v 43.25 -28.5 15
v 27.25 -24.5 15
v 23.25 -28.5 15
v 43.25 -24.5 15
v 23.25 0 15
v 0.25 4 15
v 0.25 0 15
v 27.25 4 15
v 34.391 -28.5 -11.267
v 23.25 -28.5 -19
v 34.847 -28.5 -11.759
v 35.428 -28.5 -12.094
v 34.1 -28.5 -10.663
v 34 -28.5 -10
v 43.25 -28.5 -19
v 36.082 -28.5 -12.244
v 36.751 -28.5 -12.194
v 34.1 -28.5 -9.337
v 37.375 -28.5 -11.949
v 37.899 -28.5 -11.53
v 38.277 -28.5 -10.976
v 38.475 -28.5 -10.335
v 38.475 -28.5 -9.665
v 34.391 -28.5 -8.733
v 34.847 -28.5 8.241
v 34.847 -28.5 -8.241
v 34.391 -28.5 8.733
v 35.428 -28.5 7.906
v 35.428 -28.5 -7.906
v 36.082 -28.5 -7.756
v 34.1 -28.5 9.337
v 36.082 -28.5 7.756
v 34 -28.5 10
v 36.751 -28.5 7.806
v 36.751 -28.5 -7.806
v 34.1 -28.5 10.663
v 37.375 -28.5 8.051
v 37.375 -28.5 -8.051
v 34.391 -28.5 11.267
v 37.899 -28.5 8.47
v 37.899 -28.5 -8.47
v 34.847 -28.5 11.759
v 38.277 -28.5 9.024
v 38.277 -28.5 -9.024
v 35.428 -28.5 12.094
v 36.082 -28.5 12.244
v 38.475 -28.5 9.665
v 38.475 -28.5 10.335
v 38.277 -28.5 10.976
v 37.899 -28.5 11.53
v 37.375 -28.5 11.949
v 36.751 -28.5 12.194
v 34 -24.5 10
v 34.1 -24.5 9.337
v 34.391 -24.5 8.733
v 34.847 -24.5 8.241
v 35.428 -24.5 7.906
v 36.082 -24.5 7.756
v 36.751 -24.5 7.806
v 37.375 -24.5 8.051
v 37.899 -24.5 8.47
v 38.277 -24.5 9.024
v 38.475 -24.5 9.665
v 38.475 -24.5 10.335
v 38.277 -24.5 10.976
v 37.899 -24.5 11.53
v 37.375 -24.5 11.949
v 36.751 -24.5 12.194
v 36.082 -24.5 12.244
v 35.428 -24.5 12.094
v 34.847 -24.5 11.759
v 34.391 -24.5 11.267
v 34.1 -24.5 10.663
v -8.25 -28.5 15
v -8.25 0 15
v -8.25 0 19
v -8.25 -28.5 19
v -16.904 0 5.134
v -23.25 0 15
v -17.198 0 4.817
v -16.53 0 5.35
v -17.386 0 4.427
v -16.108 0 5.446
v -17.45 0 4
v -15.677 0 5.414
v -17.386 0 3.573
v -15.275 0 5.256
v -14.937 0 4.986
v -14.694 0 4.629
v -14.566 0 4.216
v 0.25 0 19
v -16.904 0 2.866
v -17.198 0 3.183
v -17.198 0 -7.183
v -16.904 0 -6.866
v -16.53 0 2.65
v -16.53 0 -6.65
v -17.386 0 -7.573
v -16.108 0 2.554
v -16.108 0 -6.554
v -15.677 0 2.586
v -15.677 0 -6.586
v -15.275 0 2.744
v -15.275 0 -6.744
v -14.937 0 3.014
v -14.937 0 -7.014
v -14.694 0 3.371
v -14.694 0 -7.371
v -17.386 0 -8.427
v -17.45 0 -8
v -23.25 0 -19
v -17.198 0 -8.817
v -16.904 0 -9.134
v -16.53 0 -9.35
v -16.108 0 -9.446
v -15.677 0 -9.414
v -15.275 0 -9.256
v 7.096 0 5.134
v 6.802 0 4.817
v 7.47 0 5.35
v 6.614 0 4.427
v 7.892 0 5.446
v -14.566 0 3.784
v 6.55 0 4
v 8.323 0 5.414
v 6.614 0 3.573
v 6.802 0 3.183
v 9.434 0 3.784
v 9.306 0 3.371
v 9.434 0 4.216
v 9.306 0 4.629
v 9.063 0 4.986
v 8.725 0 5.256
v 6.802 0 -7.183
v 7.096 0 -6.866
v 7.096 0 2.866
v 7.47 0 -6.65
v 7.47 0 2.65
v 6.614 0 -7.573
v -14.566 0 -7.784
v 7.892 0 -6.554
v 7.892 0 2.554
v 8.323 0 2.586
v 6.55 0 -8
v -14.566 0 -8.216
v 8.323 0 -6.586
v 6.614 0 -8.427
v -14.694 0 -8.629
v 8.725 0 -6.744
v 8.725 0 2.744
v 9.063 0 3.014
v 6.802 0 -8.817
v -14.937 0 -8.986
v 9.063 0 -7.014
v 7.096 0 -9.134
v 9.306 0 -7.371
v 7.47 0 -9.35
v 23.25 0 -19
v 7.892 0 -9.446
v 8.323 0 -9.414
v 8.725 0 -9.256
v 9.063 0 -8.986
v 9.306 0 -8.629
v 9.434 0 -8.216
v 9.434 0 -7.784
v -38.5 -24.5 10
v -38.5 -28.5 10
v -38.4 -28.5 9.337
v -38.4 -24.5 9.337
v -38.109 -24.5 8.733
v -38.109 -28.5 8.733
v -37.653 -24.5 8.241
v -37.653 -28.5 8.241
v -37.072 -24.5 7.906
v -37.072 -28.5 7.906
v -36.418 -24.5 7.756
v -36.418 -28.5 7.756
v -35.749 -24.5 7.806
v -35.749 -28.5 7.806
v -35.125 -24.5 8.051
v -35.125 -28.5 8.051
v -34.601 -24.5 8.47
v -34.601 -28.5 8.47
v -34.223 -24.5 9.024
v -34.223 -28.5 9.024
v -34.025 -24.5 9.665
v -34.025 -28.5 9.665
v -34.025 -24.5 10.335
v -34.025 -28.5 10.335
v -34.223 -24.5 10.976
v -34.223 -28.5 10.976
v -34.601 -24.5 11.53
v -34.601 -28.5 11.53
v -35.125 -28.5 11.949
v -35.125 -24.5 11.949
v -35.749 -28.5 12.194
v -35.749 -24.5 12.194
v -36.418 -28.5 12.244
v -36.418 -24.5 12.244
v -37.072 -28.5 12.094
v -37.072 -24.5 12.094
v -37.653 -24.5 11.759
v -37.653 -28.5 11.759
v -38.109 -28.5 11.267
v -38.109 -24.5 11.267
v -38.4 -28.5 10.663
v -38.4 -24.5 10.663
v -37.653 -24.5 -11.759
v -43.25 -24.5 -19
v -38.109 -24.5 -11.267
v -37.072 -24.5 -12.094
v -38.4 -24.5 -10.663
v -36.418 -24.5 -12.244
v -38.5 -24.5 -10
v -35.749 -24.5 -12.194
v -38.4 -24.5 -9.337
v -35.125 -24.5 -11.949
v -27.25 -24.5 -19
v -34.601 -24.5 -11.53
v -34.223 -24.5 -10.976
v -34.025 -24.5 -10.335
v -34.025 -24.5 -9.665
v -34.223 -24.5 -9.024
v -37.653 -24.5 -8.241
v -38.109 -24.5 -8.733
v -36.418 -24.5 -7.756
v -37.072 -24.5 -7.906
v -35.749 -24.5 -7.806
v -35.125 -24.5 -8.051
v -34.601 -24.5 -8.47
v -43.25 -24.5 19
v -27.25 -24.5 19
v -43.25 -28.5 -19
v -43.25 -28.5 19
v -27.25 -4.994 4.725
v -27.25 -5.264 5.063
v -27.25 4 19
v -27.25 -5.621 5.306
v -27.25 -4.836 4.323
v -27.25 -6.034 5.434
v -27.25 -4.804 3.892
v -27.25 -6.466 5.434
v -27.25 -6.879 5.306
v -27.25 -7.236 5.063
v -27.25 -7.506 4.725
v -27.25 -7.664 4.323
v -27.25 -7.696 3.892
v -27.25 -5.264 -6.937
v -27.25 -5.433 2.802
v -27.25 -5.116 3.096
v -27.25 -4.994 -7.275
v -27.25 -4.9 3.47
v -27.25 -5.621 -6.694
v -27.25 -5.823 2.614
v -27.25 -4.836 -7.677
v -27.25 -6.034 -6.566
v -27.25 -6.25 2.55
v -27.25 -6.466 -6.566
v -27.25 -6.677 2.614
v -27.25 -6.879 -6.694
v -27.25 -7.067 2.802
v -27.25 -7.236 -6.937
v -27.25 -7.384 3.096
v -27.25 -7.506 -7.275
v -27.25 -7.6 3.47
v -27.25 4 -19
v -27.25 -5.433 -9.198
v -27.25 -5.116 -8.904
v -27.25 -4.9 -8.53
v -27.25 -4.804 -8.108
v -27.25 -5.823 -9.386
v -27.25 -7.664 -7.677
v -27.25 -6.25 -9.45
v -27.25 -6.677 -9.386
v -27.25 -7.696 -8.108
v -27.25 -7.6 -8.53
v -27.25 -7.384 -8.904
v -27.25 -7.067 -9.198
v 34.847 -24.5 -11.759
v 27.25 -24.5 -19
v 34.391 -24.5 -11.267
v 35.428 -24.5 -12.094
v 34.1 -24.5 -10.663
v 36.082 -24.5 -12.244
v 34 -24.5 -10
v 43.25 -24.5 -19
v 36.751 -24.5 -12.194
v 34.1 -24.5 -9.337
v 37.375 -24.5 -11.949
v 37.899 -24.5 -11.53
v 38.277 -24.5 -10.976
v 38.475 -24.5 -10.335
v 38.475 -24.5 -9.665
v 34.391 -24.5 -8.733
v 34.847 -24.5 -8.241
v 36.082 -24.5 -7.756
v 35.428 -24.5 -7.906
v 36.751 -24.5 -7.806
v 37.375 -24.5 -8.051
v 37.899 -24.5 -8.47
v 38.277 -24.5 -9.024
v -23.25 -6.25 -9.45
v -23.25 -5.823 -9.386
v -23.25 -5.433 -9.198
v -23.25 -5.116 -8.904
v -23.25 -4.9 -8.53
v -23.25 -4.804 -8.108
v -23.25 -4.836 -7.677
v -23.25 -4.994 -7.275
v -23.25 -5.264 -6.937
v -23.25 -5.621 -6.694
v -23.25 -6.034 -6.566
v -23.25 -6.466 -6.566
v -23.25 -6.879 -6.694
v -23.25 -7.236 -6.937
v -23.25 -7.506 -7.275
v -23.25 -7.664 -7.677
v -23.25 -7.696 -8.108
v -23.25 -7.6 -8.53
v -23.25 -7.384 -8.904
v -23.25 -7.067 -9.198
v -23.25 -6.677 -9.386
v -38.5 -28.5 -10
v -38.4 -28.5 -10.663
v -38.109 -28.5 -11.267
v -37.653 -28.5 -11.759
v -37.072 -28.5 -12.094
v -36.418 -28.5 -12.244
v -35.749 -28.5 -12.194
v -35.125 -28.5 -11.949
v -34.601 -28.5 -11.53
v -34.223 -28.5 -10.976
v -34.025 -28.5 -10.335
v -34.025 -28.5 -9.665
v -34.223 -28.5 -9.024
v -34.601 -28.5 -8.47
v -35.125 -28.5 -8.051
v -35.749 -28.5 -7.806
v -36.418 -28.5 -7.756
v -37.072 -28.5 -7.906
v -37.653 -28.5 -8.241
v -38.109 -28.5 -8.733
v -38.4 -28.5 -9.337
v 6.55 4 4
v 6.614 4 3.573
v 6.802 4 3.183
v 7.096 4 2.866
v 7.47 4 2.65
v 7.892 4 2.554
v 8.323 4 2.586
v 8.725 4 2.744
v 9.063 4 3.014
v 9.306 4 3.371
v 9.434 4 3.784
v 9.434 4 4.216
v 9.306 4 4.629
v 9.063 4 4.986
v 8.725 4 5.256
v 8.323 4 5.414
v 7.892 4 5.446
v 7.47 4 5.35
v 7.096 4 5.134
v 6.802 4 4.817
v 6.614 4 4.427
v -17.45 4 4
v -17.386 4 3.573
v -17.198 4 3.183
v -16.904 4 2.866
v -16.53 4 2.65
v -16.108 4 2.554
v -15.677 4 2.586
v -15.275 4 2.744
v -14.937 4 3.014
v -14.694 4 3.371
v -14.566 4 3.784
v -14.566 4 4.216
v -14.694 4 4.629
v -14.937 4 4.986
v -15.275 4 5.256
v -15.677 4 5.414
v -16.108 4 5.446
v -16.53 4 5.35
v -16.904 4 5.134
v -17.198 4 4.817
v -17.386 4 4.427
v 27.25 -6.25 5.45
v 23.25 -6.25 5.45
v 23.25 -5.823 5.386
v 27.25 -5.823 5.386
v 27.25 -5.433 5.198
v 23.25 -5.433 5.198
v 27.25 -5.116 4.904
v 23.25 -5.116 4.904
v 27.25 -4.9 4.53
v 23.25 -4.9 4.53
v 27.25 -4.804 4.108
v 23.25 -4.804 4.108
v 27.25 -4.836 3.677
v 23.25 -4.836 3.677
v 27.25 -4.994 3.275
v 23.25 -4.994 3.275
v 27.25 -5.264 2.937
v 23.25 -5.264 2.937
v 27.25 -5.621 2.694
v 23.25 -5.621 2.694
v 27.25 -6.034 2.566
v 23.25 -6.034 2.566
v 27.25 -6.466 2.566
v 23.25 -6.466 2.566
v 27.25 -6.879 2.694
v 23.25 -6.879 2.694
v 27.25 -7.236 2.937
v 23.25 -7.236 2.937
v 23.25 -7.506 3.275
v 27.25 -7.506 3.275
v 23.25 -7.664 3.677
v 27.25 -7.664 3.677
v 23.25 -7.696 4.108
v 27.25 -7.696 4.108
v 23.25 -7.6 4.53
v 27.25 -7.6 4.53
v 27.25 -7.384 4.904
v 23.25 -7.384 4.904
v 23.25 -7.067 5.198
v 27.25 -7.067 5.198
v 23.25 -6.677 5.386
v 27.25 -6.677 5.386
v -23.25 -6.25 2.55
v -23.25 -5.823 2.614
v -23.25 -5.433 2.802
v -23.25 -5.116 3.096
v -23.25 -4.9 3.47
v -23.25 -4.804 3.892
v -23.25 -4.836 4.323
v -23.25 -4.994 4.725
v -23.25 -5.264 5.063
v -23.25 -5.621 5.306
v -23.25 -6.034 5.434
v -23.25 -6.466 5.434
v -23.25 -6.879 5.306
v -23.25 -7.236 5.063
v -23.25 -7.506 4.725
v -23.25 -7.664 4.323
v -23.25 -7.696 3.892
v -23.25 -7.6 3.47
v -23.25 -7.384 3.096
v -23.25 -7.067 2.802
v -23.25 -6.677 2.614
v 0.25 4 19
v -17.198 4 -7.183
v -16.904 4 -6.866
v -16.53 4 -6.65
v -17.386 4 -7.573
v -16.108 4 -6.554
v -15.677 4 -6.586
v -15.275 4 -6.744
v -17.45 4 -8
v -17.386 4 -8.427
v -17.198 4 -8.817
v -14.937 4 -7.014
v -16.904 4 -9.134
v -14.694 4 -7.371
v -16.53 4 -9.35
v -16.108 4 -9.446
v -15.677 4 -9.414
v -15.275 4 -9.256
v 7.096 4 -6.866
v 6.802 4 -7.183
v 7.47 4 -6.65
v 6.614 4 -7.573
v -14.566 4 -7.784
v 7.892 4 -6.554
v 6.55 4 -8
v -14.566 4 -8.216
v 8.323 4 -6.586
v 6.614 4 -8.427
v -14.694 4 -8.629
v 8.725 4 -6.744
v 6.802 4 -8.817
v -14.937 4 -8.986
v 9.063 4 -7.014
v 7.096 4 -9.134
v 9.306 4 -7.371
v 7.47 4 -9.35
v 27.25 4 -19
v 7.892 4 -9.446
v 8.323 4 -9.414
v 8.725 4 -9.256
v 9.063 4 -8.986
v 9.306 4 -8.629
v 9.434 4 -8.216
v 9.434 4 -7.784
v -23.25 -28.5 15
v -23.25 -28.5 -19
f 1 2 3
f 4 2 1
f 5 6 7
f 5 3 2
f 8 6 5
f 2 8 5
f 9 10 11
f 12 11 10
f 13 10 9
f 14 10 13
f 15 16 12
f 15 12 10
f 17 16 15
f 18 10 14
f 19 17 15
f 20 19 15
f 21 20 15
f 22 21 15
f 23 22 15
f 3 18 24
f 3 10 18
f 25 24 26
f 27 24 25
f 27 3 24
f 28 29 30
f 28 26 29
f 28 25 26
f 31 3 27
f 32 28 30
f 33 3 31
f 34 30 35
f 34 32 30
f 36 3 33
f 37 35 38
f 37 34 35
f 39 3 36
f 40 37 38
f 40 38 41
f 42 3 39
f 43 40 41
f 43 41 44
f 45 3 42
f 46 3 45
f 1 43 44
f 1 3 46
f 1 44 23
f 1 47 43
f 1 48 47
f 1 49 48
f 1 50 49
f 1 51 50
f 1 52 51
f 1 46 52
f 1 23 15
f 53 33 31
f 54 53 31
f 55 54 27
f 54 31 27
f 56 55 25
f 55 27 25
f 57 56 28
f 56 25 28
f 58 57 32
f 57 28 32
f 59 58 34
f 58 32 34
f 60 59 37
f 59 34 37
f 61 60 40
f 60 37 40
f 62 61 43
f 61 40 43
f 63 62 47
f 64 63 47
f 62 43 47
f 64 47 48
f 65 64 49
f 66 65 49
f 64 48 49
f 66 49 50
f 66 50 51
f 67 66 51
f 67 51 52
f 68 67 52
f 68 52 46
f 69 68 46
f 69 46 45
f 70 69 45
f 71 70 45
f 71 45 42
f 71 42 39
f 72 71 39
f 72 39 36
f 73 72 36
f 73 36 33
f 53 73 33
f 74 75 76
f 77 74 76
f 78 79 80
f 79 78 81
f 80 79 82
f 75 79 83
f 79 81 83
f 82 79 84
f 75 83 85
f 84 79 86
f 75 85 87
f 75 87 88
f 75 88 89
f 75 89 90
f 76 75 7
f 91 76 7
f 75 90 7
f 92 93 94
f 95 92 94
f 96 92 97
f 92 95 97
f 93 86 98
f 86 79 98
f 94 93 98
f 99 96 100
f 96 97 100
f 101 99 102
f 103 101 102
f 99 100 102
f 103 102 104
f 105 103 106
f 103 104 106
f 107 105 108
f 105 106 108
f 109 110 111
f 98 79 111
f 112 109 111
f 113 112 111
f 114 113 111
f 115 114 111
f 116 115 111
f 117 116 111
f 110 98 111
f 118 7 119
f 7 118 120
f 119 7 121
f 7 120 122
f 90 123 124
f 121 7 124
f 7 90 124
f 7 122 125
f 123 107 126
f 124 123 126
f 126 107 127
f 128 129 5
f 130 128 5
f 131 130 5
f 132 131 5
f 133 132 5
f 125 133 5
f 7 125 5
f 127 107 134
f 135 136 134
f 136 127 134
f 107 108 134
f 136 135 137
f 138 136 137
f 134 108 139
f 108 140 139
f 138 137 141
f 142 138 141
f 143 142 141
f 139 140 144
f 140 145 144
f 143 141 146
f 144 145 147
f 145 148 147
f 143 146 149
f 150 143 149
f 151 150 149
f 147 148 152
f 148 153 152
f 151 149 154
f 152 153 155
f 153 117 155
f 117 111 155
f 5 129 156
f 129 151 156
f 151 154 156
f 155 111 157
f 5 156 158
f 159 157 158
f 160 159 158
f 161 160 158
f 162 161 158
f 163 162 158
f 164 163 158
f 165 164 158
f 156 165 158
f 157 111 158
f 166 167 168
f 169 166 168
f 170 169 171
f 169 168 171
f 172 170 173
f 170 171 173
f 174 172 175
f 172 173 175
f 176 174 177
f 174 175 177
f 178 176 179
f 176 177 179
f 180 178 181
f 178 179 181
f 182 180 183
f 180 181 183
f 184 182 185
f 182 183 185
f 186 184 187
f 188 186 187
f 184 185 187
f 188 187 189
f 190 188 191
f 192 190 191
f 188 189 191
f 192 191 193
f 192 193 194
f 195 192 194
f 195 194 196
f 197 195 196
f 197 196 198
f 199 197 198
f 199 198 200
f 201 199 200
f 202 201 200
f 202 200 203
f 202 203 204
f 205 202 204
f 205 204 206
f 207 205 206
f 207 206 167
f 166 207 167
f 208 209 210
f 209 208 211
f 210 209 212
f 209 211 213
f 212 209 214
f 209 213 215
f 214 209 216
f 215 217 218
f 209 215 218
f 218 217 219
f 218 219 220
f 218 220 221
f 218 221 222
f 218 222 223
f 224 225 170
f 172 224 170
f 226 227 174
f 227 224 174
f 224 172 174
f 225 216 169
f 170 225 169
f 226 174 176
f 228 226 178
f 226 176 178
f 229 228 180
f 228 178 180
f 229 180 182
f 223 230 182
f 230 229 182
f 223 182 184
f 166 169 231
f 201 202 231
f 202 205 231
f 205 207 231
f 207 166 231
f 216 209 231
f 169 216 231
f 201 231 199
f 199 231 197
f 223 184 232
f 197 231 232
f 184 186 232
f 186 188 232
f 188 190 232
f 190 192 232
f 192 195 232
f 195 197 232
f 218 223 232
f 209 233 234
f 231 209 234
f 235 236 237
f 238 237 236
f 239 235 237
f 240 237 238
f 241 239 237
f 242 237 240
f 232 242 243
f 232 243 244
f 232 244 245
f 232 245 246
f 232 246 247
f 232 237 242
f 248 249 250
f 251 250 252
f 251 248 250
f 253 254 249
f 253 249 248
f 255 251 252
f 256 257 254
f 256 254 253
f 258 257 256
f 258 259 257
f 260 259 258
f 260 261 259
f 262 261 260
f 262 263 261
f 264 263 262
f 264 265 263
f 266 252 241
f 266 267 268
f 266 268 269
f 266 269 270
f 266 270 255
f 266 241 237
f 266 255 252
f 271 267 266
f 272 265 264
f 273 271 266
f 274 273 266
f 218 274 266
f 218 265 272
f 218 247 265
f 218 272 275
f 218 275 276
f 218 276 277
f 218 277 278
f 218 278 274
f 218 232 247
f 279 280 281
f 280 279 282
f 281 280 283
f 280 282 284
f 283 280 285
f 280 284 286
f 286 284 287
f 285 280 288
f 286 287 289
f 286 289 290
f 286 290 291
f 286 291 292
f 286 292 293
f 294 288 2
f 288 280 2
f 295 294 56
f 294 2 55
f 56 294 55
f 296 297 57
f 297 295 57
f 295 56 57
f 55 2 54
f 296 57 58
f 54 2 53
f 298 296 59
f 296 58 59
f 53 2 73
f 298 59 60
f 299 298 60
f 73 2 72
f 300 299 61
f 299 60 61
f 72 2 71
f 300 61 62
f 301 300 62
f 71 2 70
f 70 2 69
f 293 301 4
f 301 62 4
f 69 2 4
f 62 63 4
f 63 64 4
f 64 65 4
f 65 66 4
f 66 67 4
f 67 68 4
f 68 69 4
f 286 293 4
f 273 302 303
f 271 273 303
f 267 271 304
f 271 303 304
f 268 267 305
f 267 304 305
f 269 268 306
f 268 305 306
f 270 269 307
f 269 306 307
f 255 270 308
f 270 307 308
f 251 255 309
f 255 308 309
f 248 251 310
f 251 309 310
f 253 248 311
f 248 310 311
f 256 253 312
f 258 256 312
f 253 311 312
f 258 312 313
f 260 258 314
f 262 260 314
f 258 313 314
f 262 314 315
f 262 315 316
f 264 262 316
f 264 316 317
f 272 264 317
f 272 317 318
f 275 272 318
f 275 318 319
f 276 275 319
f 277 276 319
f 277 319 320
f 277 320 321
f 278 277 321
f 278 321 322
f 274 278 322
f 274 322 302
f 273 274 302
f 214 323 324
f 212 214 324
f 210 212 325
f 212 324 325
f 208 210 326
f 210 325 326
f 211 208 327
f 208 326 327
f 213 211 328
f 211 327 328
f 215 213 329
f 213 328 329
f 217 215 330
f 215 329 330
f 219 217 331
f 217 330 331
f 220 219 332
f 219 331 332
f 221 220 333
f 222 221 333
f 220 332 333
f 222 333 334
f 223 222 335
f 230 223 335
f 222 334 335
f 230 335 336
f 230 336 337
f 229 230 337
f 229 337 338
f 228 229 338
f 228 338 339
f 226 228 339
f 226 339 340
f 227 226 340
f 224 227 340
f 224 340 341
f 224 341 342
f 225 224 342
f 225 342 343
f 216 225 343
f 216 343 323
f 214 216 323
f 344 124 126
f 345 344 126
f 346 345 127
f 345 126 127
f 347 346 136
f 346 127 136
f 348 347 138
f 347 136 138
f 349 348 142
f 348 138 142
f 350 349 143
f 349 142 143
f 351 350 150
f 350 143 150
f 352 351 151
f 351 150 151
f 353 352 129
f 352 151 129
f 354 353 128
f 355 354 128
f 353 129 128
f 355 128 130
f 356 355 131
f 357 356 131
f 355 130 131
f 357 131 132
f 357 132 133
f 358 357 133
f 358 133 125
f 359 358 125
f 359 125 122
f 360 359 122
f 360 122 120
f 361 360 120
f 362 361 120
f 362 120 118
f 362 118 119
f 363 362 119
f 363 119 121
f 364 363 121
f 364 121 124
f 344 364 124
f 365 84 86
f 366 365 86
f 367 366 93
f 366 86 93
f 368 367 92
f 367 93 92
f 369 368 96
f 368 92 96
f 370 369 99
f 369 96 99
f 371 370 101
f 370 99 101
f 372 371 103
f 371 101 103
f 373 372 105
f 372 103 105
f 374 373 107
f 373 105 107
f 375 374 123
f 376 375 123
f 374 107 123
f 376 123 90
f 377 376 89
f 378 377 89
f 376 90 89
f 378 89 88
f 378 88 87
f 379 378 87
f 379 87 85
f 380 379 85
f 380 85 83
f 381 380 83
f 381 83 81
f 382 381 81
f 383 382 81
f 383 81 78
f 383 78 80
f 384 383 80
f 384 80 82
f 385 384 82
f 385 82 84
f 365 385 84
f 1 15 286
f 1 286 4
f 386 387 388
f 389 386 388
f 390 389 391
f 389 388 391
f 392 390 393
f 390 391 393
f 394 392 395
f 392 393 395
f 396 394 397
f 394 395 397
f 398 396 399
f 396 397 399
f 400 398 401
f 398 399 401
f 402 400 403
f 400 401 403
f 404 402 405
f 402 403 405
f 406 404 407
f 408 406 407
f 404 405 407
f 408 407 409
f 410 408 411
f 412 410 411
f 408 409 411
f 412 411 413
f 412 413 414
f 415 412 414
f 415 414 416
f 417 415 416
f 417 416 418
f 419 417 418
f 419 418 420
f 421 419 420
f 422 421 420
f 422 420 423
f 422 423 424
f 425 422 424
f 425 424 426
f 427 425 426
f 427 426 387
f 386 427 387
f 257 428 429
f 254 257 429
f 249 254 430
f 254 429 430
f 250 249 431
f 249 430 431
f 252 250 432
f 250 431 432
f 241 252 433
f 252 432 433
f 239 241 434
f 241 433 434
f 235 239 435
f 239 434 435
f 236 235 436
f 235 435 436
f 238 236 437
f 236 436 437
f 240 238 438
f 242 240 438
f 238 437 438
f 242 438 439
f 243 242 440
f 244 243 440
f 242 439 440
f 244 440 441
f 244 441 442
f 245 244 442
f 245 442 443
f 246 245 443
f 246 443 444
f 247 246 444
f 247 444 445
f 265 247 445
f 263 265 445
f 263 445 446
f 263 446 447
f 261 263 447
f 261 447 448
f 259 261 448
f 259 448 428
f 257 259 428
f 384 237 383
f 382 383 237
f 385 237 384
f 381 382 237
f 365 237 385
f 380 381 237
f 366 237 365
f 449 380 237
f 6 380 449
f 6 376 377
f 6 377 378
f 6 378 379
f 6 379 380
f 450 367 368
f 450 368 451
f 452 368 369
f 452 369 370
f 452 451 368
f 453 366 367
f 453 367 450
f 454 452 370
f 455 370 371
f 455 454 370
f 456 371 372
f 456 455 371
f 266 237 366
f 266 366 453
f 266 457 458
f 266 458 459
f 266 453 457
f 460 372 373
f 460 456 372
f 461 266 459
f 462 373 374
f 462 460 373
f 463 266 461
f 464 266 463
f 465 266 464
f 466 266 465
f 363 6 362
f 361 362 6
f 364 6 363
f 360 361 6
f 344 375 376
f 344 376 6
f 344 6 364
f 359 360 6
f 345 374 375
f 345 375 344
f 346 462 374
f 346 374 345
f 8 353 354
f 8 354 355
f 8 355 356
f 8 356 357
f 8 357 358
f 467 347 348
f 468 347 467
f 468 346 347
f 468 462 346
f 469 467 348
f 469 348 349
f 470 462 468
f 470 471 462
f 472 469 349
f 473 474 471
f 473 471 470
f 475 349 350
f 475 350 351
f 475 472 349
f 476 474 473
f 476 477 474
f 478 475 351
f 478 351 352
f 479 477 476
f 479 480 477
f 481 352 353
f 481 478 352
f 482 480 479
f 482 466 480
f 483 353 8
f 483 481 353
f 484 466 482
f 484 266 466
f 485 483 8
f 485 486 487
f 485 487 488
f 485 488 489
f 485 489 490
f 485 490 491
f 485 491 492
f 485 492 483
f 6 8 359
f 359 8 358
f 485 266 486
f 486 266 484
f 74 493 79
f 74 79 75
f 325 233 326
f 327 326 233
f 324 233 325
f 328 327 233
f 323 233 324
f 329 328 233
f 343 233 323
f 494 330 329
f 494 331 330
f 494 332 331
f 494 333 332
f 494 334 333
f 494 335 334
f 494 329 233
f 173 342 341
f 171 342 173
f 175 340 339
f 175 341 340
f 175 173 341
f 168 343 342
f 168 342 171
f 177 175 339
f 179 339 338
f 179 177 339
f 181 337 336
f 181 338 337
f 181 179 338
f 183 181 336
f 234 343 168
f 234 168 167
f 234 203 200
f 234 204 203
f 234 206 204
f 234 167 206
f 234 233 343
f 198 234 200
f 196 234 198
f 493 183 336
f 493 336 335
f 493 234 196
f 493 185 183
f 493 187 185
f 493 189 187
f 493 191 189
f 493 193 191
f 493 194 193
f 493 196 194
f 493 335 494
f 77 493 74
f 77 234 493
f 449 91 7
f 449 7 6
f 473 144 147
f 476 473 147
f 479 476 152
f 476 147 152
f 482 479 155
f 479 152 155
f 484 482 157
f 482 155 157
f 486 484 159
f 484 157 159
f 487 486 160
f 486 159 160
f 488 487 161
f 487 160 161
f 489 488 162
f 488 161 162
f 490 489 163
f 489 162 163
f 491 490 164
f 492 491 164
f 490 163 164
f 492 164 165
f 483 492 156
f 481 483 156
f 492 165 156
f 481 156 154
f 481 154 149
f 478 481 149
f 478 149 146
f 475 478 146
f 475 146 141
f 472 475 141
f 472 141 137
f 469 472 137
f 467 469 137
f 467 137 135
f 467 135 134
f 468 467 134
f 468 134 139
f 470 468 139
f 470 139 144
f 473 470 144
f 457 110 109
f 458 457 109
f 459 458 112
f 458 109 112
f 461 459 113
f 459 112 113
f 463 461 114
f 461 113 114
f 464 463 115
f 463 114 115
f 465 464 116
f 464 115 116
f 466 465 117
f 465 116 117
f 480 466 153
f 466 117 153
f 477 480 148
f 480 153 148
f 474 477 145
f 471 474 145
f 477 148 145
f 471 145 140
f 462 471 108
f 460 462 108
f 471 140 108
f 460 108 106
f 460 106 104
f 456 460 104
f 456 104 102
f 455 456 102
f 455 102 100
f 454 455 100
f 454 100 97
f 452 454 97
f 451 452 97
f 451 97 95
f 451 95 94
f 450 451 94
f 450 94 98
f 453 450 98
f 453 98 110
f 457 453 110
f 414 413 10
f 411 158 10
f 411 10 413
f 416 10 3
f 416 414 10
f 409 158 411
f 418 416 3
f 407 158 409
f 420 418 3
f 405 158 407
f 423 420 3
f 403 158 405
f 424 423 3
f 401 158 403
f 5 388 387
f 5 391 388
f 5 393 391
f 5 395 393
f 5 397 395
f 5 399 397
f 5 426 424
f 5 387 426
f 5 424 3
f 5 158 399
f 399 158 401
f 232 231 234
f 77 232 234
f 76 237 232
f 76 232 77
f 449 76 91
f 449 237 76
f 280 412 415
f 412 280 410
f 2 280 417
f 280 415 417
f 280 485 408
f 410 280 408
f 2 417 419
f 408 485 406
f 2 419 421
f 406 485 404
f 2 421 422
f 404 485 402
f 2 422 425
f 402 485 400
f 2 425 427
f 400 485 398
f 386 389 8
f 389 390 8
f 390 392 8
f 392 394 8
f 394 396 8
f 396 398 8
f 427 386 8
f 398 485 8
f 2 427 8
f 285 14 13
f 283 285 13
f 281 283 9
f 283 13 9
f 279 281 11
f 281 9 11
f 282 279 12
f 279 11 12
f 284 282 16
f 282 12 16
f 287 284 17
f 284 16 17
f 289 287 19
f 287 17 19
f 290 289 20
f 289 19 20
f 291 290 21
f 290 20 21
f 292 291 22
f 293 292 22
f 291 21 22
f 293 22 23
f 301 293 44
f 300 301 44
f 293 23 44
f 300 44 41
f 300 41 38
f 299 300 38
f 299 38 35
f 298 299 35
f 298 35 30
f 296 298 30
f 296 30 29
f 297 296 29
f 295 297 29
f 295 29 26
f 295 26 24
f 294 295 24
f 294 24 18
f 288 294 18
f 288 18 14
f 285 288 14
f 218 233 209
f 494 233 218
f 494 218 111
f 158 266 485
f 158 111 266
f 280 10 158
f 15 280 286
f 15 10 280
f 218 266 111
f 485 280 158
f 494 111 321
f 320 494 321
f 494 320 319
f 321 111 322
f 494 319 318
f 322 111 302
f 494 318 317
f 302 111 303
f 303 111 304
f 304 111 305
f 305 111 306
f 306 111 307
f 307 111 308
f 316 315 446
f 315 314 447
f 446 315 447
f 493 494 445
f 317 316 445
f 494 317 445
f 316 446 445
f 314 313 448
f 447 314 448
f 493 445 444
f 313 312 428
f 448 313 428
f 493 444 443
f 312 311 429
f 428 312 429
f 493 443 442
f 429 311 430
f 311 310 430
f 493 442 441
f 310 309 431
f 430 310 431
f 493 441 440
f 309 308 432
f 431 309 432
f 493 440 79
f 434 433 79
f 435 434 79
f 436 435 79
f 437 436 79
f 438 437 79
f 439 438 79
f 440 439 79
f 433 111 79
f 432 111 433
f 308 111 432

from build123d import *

# Parameters (mm, degrees)
SKETCH_31_W              = 54.5
SKETCH_31_H              = 38
EXTRUDE_11_DEPTH         = 4
SKETCH_32_W              = 4
SKETCH_32_H              = 38
EXTRUDE_12_DEPTH         = 28.5
SKETCH_33_W              = 16
SKETCH_33_H              = 38
EXTRUDE_13_DEPTH         = 4
SKETCH_34_W              = 15
SKETCH_34_H              = 4
EXTRUDE_14_DEPTH         = 28.5
HOLE_WIZARD_M2_5_1_D     = 2.9
HOLE_WIZARD_M2_5_1_DEPTH = 10
HOLE_WIZARD_M2_5_1_TIP   = 0.871247898
HOLE_WIZARD_M2_5_2_D     = 2.9
HOLE_WIZARD_M2_5_2_DEPTH = 10
HOLE_WIZARD_M2_5_2_TIP   = 0.871247898
HOLE_WIZARD_M2_5_3_D     = 2.9
HOLE_WIZARD_M2_5_3_DEPTH = 10
HOLE_WIZARD_M2_5_3_TIP   = 0.871247898
HOLE_WIZARD_M4_1_D       = 4.5
HOLE_WIZARD_M4_1_DEPTH   = 10
HOLE_WIZARD_M4_1_TIP     = 1.351936393
SKETCH_46_W              = 43
SKETCH_46_H              = 32.5
CUT_EXTRUDE_4_DEPTH      = 4


with BuildPart() as part:
    # 스케치31 → 보스-돌출11 (new body)
    with BuildSketch(Plane(origin=(0, 0, 0), x_dir=(1, 0, 0), z_dir=(0, 1, 0))):
        Rectangle(SKETCH_31_W, SKETCH_31_H)
    extrude(amount=EXTRUDE_11_DEPTH)

    # 스케치32 → 보스-돌출12 (add)
    with BuildSketch(Plane.XZ):
        with Locations((25.25, 0)):
            Rectangle(SKETCH_32_W, SKETCH_32_H)
        with Locations((-25.25, 0)):
            Rectangle(SKETCH_32_W, SKETCH_32_H)
    extrude(amount=EXTRUDE_12_DEPTH)

    # 스케치33 → 보스-돌출13 (add)
    with BuildSketch(Plane.XZ.offset(28.5)):
        with Locations((-35.25, 0)):
            Rectangle(SKETCH_33_W, SKETCH_33_H)
        with Locations((35.25, 0)):
            Rectangle(SKETCH_33_W, SKETCH_33_H)
    extrude(amount=-EXTRUDE_13_DEPTH)

    # 스케치34 → 보스-돌출14 (add)
    with BuildSketch(Plane.XZ):
        with Locations((-15.75, 17)):
            Rectangle(SKETCH_34_W, SKETCH_34_H)
    extrude(amount=EXTRUDE_14_DEPTH)

    # M2.5 여유 구멍1
    with Locations(Plane(origin=(0, 4, 0), x_dir=(1, 0, 0), z_dir=(0, 1, 0))):
        with Locations((8, 8), (8, -4), (-16, -4), (-16, 8)):
            Hole(HOLE_WIZARD_M2_5_1_D / 2, depth=HOLE_WIZARD_M2_5_1_DEPTH)
            with Locations((0, 0, -(HOLE_WIZARD_M2_5_1_DEPTH + HOLE_WIZARD_M2_5_1_TIP / 2))):  # 118° drill point
                Cone(0, HOLE_WIZARD_M2_5_1_D / 2, HOLE_WIZARD_M2_5_1_TIP, mode=Mode.SUBTRACT)

    # M2.5 여유 구멍2
    with Locations(Plane(origin=(27.25, 0, 0), x_dir=(0, 0, -1), z_dir=(1, 0, 0))):
        with Locations((-4, -6.25)):
            Hole(HOLE_WIZARD_M2_5_2_D / 2, depth=HOLE_WIZARD_M2_5_2_DEPTH)
            with Locations((0, 0, -(HOLE_WIZARD_M2_5_2_DEPTH + HOLE_WIZARD_M2_5_2_TIP / 2))):  # 118° drill point
                Cone(0, HOLE_WIZARD_M2_5_2_D / 2, HOLE_WIZARD_M2_5_2_TIP, mode=Mode.SUBTRACT)

    # M2.5 여유 구멍3
    with Locations(Plane.ZY.offset(27.25)):
        with Locations((4, -6.25), (-8, -6.25)):
            Hole(HOLE_WIZARD_M2_5_3_D / 2, depth=HOLE_WIZARD_M2_5_3_DEPTH)
            with Locations((0, 0, -(HOLE_WIZARD_M2_5_3_DEPTH + HOLE_WIZARD_M2_5_3_TIP / 2))):  # 118° drill point
                Cone(0, HOLE_WIZARD_M2_5_3_D / 2, HOLE_WIZARD_M2_5_3_TIP, mode=Mode.SUBTRACT)

    # M4 여유 구멍1
    with Locations(Plane(origin=(0, -24.5, 0), x_dir=(1, 0, 0), z_dir=(0, 1, 0))):
        with Locations((36.25, 10), (36.25, -10), (-36.25, -10), (-36.25, 10)):
            Hole(HOLE_WIZARD_M4_1_D / 2, depth=HOLE_WIZARD_M4_1_DEPTH)
            with Locations((0, 0, -(HOLE_WIZARD_M4_1_DEPTH + HOLE_WIZARD_M4_1_TIP / 2))):  # 118° drill point
                Cone(0, HOLE_WIZARD_M4_1_D / 2, HOLE_WIZARD_M4_1_TIP, mode=Mode.SUBTRACT)

    # 스케치46 → 컷-돌출4 (cut)
    with BuildSketch(Plane.XY.offset(19)):
        with Locations((21.75, -12.25)):
            Rectangle(SKETCH_46_W, SKETCH_46_H)
    extrude(amount=-CUT_EXTRUDE_4_DEPTH, mode=Mode.SUBTRACT)


solid = part.part
